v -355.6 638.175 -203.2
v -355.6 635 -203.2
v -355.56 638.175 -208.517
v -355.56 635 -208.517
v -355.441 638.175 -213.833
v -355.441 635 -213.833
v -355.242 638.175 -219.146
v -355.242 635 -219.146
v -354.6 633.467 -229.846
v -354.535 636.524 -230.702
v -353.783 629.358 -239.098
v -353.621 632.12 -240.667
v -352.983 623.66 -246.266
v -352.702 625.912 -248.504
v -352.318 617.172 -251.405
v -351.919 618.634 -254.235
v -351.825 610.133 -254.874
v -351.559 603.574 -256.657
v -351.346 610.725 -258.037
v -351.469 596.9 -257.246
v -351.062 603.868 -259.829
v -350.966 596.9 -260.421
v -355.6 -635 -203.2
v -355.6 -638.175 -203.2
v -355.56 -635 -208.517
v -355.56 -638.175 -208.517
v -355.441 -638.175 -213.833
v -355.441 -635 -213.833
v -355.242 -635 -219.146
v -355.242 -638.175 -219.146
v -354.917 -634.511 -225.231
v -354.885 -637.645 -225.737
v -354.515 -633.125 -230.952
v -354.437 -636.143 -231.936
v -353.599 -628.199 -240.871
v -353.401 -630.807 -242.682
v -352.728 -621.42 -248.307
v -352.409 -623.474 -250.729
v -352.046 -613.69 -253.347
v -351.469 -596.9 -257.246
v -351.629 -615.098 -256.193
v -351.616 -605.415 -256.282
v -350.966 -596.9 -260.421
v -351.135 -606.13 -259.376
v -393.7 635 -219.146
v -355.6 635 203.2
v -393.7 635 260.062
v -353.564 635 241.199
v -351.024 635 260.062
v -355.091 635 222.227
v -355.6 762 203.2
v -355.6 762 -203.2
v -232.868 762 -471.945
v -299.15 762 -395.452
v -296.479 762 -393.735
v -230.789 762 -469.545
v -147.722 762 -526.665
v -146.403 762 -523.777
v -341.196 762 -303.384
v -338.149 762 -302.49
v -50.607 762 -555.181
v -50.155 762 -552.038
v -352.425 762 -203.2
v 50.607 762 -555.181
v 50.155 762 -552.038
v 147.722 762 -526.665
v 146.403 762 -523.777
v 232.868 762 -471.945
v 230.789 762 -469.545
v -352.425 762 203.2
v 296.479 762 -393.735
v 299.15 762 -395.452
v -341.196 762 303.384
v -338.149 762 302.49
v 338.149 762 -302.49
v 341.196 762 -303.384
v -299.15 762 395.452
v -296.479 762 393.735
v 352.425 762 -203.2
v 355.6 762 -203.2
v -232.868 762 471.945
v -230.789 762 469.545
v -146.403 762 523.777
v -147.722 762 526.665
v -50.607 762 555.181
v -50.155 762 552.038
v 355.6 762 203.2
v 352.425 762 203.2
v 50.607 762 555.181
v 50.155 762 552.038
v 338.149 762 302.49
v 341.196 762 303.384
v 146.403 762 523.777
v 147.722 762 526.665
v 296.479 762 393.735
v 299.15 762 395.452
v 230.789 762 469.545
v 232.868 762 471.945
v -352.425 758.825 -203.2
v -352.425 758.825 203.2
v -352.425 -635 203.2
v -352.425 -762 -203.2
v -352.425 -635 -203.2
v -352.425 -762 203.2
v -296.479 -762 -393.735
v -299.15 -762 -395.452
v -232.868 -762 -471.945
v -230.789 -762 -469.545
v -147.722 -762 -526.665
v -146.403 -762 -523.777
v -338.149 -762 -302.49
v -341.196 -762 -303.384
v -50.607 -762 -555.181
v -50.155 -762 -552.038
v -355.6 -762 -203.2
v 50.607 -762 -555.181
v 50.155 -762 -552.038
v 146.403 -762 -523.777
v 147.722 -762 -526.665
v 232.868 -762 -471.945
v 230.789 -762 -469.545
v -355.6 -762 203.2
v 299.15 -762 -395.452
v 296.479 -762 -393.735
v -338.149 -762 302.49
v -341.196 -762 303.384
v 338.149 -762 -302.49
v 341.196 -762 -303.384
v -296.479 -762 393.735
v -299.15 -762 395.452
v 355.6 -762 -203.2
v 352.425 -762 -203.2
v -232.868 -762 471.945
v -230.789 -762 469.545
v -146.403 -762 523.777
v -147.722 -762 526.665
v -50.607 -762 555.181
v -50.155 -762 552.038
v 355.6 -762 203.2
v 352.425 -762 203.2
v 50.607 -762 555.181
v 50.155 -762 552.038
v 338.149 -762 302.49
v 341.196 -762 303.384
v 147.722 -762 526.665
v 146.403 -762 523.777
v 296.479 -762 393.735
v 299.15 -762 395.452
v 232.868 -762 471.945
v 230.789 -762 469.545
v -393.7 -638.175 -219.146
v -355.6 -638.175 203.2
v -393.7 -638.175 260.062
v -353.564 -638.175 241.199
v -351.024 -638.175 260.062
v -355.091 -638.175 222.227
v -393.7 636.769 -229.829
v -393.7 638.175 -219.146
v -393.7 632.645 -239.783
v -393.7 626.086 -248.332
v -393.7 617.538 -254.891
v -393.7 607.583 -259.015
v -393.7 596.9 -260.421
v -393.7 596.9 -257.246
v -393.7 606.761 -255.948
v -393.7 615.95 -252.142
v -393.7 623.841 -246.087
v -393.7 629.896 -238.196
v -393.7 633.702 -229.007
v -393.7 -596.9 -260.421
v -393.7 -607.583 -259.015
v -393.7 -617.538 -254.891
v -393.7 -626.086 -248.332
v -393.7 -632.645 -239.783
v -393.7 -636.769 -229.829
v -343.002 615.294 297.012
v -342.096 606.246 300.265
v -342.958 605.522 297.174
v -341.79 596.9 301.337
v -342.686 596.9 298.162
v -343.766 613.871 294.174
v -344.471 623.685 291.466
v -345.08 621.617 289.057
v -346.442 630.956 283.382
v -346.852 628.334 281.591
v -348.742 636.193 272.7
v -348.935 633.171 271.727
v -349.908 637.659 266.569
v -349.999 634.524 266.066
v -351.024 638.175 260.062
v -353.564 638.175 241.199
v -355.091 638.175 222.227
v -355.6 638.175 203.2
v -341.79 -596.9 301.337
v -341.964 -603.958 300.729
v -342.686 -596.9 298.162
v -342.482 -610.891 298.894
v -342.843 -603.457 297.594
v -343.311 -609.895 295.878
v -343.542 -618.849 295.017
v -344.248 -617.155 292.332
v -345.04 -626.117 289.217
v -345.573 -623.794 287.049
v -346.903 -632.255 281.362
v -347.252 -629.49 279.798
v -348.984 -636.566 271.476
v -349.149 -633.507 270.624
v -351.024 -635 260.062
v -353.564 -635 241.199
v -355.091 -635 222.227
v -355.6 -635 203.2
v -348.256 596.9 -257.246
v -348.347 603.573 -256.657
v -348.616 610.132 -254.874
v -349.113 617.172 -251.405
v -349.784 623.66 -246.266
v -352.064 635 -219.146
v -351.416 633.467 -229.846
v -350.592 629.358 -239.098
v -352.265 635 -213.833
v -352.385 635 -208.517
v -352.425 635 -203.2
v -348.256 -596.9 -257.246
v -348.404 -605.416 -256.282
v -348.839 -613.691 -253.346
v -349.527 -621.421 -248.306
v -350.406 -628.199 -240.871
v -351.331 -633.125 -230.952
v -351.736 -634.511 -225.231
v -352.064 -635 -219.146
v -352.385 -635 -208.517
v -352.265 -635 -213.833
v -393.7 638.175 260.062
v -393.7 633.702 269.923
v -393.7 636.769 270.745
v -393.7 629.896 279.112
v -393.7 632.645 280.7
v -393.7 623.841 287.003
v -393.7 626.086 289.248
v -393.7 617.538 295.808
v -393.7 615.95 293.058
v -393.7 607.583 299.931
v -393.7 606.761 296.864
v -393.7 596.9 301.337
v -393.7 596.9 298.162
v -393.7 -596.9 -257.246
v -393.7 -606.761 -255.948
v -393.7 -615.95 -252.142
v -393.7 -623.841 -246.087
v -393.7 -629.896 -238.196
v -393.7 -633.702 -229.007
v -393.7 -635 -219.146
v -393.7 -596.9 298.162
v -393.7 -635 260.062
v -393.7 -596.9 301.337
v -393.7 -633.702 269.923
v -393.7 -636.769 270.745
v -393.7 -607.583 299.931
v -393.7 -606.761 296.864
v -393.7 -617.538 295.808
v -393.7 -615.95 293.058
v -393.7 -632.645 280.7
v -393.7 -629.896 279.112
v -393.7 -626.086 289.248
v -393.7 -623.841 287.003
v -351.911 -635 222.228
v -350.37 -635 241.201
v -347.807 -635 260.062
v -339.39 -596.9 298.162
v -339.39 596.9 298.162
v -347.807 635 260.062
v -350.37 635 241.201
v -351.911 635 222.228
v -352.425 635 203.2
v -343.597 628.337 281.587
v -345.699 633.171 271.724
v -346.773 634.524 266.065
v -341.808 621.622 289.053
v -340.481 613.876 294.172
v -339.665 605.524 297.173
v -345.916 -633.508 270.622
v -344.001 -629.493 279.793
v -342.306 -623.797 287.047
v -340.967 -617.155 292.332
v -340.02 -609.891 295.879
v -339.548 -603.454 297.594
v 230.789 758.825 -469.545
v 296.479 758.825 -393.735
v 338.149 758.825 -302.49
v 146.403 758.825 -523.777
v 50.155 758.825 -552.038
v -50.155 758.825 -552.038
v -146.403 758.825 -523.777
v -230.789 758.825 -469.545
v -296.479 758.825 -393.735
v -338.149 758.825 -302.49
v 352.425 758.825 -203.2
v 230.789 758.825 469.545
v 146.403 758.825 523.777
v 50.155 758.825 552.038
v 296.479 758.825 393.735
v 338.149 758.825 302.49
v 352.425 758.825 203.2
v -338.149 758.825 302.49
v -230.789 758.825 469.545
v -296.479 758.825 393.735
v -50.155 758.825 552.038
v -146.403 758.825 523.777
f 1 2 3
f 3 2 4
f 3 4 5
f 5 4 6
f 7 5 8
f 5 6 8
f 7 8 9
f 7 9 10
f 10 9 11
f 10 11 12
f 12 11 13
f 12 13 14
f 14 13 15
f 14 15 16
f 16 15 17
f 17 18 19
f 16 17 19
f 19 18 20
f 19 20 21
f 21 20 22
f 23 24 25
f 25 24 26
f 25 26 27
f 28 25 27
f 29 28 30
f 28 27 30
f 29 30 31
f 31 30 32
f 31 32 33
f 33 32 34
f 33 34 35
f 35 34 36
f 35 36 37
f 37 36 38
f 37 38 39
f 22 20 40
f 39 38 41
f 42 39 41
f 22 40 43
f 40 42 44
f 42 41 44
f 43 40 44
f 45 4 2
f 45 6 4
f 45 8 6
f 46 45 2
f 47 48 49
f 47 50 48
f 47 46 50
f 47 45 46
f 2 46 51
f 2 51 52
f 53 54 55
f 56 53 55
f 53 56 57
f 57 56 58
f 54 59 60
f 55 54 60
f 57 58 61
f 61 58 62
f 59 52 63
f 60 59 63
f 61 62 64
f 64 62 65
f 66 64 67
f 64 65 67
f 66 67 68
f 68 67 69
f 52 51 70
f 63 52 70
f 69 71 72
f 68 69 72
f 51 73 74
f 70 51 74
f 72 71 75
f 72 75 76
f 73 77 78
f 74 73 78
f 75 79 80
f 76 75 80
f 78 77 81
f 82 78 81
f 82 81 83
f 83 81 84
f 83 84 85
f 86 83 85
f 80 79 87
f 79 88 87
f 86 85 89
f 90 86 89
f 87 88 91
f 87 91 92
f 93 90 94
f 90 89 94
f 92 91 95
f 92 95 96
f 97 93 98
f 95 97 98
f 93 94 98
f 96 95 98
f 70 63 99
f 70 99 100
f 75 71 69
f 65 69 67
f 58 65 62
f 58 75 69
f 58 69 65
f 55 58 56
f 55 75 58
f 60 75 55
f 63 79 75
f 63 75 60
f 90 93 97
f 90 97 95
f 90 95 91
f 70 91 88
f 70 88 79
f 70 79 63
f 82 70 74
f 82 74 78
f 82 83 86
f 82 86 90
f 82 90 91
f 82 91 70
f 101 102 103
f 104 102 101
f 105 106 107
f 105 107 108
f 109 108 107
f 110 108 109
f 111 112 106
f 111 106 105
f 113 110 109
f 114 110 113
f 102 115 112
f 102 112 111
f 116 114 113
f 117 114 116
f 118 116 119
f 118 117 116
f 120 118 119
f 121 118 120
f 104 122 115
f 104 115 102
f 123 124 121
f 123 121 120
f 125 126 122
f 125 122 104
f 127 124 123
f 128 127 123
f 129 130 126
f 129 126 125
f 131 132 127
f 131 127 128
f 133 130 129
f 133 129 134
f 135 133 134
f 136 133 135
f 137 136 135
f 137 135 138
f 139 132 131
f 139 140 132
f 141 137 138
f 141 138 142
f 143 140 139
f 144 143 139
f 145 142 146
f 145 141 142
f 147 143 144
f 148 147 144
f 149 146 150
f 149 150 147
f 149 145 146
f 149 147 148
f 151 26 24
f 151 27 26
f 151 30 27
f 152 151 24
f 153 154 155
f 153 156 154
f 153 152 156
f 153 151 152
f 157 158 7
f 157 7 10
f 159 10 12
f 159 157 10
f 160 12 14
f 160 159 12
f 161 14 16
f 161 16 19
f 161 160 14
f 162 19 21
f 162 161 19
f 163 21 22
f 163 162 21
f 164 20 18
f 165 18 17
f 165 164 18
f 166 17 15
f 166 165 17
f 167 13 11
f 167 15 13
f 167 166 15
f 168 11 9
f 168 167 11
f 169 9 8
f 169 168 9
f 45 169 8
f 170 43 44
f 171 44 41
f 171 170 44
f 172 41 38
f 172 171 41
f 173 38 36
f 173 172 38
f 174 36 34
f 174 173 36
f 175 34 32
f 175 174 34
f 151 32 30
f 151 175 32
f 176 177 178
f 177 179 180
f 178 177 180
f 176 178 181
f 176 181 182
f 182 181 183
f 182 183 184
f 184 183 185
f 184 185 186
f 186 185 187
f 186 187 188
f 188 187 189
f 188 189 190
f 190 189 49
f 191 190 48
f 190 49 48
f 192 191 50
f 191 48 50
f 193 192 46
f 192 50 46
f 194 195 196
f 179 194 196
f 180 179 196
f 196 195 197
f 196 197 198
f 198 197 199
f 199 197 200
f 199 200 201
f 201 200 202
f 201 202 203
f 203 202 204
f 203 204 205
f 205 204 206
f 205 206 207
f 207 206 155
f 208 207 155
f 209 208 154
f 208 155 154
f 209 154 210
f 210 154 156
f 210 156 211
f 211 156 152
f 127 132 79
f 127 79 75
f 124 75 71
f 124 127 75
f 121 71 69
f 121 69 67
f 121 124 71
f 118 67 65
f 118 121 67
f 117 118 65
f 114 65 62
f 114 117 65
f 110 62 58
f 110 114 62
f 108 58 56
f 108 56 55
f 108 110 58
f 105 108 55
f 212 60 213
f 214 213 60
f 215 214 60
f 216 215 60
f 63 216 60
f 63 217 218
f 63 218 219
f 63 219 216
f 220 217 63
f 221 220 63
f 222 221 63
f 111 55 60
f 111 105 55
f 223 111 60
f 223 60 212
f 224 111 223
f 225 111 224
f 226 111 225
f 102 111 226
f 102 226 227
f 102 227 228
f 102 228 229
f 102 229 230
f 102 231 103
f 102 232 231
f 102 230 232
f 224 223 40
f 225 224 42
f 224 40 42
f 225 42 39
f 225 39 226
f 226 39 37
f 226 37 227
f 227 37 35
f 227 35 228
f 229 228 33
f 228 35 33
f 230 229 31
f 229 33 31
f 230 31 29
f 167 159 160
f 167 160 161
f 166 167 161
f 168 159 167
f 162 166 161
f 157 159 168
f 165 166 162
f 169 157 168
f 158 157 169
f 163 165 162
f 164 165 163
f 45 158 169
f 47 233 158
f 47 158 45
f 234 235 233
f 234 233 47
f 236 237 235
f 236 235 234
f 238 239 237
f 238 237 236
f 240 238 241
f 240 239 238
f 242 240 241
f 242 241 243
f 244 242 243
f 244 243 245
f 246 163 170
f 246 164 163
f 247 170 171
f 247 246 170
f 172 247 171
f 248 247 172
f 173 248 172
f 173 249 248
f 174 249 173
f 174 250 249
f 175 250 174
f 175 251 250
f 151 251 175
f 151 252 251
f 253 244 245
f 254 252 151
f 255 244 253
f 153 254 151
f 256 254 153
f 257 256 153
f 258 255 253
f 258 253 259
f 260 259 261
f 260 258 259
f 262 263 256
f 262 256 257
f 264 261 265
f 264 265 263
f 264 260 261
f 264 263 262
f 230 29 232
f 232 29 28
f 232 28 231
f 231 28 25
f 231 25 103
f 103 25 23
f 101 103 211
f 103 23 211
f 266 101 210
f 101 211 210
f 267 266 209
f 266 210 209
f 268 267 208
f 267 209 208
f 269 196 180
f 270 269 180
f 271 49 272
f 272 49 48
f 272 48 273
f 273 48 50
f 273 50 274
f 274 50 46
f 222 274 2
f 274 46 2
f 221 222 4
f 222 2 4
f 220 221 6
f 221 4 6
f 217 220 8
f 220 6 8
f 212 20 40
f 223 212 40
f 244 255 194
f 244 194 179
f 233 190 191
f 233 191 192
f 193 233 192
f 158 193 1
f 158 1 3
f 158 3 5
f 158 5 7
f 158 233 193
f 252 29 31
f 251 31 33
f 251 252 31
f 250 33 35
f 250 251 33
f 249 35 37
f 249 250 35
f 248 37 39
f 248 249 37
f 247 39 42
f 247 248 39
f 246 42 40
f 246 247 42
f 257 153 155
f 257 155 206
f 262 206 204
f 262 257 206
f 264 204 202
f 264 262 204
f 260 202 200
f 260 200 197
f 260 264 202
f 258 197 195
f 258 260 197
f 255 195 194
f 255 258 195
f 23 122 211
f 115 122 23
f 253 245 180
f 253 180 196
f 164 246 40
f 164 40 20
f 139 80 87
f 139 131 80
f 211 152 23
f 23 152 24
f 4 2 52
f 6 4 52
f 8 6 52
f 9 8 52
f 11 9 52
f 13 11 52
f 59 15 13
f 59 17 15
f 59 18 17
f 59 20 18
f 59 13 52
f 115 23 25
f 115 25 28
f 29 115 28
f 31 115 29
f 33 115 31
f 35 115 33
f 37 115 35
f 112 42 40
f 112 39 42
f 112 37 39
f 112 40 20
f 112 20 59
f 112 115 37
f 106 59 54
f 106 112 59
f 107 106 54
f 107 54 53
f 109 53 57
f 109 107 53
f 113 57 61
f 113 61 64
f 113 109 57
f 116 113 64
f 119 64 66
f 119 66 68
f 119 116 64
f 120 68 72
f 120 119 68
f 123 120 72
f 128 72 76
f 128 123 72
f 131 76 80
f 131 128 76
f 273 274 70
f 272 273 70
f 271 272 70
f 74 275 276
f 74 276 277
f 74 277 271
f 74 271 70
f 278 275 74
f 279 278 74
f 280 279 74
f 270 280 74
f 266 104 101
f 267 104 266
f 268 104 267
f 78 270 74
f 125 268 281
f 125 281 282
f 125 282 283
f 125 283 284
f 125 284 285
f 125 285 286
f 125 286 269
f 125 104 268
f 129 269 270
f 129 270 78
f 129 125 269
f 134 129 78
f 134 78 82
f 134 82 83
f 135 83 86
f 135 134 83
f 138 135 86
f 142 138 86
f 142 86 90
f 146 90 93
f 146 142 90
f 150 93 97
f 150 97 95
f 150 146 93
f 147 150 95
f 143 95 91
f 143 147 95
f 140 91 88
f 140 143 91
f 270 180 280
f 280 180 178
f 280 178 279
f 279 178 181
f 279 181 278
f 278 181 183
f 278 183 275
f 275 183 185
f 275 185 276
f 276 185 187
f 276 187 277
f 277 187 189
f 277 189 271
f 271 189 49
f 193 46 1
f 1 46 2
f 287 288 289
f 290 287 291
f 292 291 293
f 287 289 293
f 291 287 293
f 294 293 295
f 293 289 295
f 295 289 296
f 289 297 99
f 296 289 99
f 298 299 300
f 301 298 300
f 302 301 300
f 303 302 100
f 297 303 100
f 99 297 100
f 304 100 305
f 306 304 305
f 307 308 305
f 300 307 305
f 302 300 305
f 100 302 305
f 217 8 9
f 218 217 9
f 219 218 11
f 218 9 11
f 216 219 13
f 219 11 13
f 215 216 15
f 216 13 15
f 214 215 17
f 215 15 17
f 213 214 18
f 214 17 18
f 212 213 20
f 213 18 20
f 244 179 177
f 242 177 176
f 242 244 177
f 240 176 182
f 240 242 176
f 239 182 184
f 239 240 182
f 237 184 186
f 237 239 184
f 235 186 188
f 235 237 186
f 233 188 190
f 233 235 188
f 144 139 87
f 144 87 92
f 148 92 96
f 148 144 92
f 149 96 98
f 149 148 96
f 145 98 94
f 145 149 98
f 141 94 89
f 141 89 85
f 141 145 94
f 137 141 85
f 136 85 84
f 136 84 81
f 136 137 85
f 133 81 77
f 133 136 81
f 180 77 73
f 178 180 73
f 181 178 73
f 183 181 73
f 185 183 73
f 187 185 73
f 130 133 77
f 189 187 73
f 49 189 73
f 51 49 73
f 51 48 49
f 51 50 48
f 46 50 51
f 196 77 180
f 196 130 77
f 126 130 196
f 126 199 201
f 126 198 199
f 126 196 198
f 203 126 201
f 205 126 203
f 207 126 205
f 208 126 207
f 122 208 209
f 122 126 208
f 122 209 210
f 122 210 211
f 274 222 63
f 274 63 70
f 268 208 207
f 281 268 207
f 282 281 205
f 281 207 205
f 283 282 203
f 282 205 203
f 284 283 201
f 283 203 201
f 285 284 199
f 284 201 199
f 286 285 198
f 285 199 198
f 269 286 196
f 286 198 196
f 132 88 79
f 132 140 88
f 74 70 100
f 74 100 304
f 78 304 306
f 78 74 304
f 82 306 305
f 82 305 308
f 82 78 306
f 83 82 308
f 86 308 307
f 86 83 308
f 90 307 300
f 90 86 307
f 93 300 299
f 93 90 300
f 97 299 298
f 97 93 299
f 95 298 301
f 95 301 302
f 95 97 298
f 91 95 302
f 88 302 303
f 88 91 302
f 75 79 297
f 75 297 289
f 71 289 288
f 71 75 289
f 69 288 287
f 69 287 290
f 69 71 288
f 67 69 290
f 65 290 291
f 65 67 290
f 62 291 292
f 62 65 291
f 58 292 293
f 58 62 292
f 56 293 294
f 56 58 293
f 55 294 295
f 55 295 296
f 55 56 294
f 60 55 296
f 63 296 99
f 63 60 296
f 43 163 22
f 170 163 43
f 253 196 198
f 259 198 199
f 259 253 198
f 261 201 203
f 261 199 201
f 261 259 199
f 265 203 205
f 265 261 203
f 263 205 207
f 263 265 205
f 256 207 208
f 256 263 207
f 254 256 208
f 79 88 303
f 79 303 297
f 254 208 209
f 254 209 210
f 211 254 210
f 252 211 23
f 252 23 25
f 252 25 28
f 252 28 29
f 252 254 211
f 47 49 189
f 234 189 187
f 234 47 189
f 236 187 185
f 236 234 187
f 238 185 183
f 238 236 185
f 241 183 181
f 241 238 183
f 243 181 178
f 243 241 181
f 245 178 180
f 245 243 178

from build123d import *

# Parameters (mm, degrees)
F1_DEPTH = 762
F3_DEPTH = 25.4
F8_DEPTH = 3.175


with BuildPart() as f1:
    # F0 (on Front) → F1 (new body, symmetric)
    with BuildSketch(Plane.XZ):
        with BuildLine():
            ThreePointArc((355.6, 203.2), (0, 558.8), (-355.6, 203.2))
            Line((-355.6, 203.2), (-355.6, -203.2))
            ThreePointArc((-355.6, -203.2), (0, -558.8), (355.6, -203.2))
            Line((355.6, -203.2), (355.6, 203.2))
        make_face()
        with BuildLine():
            ThreePointArc((-352.425, 203.2), (0, 555.625), (352.425, 203.2))
            Line((352.425, 203.2), (352.425, -203.2))
            ThreePointArc((352.425, -203.2), (0, -555.625), (-352.425, -203.2))
            Line((-352.425, -203.2), (-352.425, 203.2))
        make_face(mode=Mode.SUBTRACT)
    extrude(amount=F1_DEPTH, both=True)

    # F2 (on face) → F3 (cut)
    with BuildSketch(Plane(origin=(-355.6, 0, 0), x_dir=(0, -1, 0), z_dir=(-1, 0, 0))):
        with BuildLine():
            Line((596.9, 298.1624071598), (-596.9, 298.1624071598))
            ThreePointArc((-596.9, 298.1624071598), (-623.8407683632, 287.003175523), (-635, 260.0624071598))
            Line((-635, 260.0624071598), (-635, -219.1459578514))
            ThreePointArc((-635, -219.1459578514), (-623.8407683632, -246.0867262146), (-596.9, -257.2459578514))
            Line((-596.9, -257.2459578514), (596.9, -257.2459578514))
            ThreePointArc((596.9, -257.2459578514), (623.8407683632, -246.0867262146), (635, -219.1459578514))
            Line((635, -219.1459578514), (635, 260.0624071598))
            ThreePointArc((635, 260.0624071598), (623.8407683632, 287.003175523), (596.9, 298.1624071598))
        make_face()
    extrude(amount=-F3_DEPTH, mode=Mode.SUBTRACT)


with BuildPart() as f6:
    # F5 (on offset) → F6 (new body, up to the next surface of F1)
    with BuildSketch(Plane(origin=(-393.7, 0, 0), x_dir=(0, -1, 0), z_dir=(-1, 0, 0))):
        with BuildLine():
            Line((638.175, 203.2), (638.175, 260.0624071598))
            ThreePointArc((638.175, 260.0624071598), (626.0858323935, 289.2482395533), (596.9, 301.3374071598))
            Line((596.9, 301.3374071598), (-596.9, 301.3374071598))
            ThreePointArc((-596.9, 301.3374071598), (-626.0858323935, 289.2482395533), (-638.175, 260.0624071598))
            Line((-638.175, 260.0624071598), (-638.175, 203.2))
            Line((-638.175, 203.2), (-638.175, -203.2))
            Line((-638.175, -203.2), (-638.175, -219.1459578514))
            ThreePointArc((-638.175, -219.1459578514), (-626.0858323935, -248.3317902449), (-596.9, -260.4209578514))
            Line((-596.9, -260.4209578514), (596.9, -260.4209578514))
            ThreePointArc((596.9, -260.4209578514), (626.0858323935, -248.3317902449), (638.175, -219.1459578514))
            Line((638.175, -219.1459578514), (638.175, -203.2))
            Line((638.175, -203.2), (638.175, 203.2))
        make_face()
        with BuildLine():
            Line((596.9, -257.2459578514), (-596.9, -257.2459578514))
            ThreePointArc((-596.9, -257.2459578514), (-623.8407683632, -246.0867262146), (-635, -219.1459578514))
            Line((-635, -219.1459578514), (-635, -203.2))
            Line((-635, -203.2), (-635, 203.2))
            Line((-635, 203.2), (-635, 260.0624071598))
            ThreePointArc((-635, 260.0624071598), (-623.8407683632, 287.003175523), (-596.9, 298.1624071598))
            Line((-596.9, 298.1624071598), (596.9, 298.1624071598))
            ThreePointArc((596.9, 298.1624071598), (623.8407683632, 287.003175523), (635, 260.0624071598))
            Line((635, 260.0624071598), (635, 203.2))
            Line((635, 203.2), (635, -203.2))
            Line((635, -203.2), (635, -219.1459578514))
            ThreePointArc((635, -219.1459578514), (623.8407683632, -246.0867262146), (596.9, -257.2459578514))
        make_face(mode=Mode.SUBTRACT)
    extrude(until=Until.NEXT, target=f1.part, dir=(1, 0, 0))


with BuildPart() as f8:
    # F7 (on face) → F8 (new body)
    with BuildSketch(Plane(origin=(0, 762, 0), x_dir=(-1, 0, 0), z_dir=(0, 1, 0))):
        with BuildLine():
            ThreePointArc((352.425, 203.2), (0, 555.625), (-352.425, 203.2))
            Line((-352.425, 203.2), (-352.425, -203.2))
            ThreePointArc((-352.425, -203.2), (0, -555.625), (352.425, -203.2))
            Line((352.425, -203.2), (352.425, 203.2))
        make_face()
    extrude(amount=-F8_DEPTH)


solid = Compound([f1.part, f6.part, f8.part])
